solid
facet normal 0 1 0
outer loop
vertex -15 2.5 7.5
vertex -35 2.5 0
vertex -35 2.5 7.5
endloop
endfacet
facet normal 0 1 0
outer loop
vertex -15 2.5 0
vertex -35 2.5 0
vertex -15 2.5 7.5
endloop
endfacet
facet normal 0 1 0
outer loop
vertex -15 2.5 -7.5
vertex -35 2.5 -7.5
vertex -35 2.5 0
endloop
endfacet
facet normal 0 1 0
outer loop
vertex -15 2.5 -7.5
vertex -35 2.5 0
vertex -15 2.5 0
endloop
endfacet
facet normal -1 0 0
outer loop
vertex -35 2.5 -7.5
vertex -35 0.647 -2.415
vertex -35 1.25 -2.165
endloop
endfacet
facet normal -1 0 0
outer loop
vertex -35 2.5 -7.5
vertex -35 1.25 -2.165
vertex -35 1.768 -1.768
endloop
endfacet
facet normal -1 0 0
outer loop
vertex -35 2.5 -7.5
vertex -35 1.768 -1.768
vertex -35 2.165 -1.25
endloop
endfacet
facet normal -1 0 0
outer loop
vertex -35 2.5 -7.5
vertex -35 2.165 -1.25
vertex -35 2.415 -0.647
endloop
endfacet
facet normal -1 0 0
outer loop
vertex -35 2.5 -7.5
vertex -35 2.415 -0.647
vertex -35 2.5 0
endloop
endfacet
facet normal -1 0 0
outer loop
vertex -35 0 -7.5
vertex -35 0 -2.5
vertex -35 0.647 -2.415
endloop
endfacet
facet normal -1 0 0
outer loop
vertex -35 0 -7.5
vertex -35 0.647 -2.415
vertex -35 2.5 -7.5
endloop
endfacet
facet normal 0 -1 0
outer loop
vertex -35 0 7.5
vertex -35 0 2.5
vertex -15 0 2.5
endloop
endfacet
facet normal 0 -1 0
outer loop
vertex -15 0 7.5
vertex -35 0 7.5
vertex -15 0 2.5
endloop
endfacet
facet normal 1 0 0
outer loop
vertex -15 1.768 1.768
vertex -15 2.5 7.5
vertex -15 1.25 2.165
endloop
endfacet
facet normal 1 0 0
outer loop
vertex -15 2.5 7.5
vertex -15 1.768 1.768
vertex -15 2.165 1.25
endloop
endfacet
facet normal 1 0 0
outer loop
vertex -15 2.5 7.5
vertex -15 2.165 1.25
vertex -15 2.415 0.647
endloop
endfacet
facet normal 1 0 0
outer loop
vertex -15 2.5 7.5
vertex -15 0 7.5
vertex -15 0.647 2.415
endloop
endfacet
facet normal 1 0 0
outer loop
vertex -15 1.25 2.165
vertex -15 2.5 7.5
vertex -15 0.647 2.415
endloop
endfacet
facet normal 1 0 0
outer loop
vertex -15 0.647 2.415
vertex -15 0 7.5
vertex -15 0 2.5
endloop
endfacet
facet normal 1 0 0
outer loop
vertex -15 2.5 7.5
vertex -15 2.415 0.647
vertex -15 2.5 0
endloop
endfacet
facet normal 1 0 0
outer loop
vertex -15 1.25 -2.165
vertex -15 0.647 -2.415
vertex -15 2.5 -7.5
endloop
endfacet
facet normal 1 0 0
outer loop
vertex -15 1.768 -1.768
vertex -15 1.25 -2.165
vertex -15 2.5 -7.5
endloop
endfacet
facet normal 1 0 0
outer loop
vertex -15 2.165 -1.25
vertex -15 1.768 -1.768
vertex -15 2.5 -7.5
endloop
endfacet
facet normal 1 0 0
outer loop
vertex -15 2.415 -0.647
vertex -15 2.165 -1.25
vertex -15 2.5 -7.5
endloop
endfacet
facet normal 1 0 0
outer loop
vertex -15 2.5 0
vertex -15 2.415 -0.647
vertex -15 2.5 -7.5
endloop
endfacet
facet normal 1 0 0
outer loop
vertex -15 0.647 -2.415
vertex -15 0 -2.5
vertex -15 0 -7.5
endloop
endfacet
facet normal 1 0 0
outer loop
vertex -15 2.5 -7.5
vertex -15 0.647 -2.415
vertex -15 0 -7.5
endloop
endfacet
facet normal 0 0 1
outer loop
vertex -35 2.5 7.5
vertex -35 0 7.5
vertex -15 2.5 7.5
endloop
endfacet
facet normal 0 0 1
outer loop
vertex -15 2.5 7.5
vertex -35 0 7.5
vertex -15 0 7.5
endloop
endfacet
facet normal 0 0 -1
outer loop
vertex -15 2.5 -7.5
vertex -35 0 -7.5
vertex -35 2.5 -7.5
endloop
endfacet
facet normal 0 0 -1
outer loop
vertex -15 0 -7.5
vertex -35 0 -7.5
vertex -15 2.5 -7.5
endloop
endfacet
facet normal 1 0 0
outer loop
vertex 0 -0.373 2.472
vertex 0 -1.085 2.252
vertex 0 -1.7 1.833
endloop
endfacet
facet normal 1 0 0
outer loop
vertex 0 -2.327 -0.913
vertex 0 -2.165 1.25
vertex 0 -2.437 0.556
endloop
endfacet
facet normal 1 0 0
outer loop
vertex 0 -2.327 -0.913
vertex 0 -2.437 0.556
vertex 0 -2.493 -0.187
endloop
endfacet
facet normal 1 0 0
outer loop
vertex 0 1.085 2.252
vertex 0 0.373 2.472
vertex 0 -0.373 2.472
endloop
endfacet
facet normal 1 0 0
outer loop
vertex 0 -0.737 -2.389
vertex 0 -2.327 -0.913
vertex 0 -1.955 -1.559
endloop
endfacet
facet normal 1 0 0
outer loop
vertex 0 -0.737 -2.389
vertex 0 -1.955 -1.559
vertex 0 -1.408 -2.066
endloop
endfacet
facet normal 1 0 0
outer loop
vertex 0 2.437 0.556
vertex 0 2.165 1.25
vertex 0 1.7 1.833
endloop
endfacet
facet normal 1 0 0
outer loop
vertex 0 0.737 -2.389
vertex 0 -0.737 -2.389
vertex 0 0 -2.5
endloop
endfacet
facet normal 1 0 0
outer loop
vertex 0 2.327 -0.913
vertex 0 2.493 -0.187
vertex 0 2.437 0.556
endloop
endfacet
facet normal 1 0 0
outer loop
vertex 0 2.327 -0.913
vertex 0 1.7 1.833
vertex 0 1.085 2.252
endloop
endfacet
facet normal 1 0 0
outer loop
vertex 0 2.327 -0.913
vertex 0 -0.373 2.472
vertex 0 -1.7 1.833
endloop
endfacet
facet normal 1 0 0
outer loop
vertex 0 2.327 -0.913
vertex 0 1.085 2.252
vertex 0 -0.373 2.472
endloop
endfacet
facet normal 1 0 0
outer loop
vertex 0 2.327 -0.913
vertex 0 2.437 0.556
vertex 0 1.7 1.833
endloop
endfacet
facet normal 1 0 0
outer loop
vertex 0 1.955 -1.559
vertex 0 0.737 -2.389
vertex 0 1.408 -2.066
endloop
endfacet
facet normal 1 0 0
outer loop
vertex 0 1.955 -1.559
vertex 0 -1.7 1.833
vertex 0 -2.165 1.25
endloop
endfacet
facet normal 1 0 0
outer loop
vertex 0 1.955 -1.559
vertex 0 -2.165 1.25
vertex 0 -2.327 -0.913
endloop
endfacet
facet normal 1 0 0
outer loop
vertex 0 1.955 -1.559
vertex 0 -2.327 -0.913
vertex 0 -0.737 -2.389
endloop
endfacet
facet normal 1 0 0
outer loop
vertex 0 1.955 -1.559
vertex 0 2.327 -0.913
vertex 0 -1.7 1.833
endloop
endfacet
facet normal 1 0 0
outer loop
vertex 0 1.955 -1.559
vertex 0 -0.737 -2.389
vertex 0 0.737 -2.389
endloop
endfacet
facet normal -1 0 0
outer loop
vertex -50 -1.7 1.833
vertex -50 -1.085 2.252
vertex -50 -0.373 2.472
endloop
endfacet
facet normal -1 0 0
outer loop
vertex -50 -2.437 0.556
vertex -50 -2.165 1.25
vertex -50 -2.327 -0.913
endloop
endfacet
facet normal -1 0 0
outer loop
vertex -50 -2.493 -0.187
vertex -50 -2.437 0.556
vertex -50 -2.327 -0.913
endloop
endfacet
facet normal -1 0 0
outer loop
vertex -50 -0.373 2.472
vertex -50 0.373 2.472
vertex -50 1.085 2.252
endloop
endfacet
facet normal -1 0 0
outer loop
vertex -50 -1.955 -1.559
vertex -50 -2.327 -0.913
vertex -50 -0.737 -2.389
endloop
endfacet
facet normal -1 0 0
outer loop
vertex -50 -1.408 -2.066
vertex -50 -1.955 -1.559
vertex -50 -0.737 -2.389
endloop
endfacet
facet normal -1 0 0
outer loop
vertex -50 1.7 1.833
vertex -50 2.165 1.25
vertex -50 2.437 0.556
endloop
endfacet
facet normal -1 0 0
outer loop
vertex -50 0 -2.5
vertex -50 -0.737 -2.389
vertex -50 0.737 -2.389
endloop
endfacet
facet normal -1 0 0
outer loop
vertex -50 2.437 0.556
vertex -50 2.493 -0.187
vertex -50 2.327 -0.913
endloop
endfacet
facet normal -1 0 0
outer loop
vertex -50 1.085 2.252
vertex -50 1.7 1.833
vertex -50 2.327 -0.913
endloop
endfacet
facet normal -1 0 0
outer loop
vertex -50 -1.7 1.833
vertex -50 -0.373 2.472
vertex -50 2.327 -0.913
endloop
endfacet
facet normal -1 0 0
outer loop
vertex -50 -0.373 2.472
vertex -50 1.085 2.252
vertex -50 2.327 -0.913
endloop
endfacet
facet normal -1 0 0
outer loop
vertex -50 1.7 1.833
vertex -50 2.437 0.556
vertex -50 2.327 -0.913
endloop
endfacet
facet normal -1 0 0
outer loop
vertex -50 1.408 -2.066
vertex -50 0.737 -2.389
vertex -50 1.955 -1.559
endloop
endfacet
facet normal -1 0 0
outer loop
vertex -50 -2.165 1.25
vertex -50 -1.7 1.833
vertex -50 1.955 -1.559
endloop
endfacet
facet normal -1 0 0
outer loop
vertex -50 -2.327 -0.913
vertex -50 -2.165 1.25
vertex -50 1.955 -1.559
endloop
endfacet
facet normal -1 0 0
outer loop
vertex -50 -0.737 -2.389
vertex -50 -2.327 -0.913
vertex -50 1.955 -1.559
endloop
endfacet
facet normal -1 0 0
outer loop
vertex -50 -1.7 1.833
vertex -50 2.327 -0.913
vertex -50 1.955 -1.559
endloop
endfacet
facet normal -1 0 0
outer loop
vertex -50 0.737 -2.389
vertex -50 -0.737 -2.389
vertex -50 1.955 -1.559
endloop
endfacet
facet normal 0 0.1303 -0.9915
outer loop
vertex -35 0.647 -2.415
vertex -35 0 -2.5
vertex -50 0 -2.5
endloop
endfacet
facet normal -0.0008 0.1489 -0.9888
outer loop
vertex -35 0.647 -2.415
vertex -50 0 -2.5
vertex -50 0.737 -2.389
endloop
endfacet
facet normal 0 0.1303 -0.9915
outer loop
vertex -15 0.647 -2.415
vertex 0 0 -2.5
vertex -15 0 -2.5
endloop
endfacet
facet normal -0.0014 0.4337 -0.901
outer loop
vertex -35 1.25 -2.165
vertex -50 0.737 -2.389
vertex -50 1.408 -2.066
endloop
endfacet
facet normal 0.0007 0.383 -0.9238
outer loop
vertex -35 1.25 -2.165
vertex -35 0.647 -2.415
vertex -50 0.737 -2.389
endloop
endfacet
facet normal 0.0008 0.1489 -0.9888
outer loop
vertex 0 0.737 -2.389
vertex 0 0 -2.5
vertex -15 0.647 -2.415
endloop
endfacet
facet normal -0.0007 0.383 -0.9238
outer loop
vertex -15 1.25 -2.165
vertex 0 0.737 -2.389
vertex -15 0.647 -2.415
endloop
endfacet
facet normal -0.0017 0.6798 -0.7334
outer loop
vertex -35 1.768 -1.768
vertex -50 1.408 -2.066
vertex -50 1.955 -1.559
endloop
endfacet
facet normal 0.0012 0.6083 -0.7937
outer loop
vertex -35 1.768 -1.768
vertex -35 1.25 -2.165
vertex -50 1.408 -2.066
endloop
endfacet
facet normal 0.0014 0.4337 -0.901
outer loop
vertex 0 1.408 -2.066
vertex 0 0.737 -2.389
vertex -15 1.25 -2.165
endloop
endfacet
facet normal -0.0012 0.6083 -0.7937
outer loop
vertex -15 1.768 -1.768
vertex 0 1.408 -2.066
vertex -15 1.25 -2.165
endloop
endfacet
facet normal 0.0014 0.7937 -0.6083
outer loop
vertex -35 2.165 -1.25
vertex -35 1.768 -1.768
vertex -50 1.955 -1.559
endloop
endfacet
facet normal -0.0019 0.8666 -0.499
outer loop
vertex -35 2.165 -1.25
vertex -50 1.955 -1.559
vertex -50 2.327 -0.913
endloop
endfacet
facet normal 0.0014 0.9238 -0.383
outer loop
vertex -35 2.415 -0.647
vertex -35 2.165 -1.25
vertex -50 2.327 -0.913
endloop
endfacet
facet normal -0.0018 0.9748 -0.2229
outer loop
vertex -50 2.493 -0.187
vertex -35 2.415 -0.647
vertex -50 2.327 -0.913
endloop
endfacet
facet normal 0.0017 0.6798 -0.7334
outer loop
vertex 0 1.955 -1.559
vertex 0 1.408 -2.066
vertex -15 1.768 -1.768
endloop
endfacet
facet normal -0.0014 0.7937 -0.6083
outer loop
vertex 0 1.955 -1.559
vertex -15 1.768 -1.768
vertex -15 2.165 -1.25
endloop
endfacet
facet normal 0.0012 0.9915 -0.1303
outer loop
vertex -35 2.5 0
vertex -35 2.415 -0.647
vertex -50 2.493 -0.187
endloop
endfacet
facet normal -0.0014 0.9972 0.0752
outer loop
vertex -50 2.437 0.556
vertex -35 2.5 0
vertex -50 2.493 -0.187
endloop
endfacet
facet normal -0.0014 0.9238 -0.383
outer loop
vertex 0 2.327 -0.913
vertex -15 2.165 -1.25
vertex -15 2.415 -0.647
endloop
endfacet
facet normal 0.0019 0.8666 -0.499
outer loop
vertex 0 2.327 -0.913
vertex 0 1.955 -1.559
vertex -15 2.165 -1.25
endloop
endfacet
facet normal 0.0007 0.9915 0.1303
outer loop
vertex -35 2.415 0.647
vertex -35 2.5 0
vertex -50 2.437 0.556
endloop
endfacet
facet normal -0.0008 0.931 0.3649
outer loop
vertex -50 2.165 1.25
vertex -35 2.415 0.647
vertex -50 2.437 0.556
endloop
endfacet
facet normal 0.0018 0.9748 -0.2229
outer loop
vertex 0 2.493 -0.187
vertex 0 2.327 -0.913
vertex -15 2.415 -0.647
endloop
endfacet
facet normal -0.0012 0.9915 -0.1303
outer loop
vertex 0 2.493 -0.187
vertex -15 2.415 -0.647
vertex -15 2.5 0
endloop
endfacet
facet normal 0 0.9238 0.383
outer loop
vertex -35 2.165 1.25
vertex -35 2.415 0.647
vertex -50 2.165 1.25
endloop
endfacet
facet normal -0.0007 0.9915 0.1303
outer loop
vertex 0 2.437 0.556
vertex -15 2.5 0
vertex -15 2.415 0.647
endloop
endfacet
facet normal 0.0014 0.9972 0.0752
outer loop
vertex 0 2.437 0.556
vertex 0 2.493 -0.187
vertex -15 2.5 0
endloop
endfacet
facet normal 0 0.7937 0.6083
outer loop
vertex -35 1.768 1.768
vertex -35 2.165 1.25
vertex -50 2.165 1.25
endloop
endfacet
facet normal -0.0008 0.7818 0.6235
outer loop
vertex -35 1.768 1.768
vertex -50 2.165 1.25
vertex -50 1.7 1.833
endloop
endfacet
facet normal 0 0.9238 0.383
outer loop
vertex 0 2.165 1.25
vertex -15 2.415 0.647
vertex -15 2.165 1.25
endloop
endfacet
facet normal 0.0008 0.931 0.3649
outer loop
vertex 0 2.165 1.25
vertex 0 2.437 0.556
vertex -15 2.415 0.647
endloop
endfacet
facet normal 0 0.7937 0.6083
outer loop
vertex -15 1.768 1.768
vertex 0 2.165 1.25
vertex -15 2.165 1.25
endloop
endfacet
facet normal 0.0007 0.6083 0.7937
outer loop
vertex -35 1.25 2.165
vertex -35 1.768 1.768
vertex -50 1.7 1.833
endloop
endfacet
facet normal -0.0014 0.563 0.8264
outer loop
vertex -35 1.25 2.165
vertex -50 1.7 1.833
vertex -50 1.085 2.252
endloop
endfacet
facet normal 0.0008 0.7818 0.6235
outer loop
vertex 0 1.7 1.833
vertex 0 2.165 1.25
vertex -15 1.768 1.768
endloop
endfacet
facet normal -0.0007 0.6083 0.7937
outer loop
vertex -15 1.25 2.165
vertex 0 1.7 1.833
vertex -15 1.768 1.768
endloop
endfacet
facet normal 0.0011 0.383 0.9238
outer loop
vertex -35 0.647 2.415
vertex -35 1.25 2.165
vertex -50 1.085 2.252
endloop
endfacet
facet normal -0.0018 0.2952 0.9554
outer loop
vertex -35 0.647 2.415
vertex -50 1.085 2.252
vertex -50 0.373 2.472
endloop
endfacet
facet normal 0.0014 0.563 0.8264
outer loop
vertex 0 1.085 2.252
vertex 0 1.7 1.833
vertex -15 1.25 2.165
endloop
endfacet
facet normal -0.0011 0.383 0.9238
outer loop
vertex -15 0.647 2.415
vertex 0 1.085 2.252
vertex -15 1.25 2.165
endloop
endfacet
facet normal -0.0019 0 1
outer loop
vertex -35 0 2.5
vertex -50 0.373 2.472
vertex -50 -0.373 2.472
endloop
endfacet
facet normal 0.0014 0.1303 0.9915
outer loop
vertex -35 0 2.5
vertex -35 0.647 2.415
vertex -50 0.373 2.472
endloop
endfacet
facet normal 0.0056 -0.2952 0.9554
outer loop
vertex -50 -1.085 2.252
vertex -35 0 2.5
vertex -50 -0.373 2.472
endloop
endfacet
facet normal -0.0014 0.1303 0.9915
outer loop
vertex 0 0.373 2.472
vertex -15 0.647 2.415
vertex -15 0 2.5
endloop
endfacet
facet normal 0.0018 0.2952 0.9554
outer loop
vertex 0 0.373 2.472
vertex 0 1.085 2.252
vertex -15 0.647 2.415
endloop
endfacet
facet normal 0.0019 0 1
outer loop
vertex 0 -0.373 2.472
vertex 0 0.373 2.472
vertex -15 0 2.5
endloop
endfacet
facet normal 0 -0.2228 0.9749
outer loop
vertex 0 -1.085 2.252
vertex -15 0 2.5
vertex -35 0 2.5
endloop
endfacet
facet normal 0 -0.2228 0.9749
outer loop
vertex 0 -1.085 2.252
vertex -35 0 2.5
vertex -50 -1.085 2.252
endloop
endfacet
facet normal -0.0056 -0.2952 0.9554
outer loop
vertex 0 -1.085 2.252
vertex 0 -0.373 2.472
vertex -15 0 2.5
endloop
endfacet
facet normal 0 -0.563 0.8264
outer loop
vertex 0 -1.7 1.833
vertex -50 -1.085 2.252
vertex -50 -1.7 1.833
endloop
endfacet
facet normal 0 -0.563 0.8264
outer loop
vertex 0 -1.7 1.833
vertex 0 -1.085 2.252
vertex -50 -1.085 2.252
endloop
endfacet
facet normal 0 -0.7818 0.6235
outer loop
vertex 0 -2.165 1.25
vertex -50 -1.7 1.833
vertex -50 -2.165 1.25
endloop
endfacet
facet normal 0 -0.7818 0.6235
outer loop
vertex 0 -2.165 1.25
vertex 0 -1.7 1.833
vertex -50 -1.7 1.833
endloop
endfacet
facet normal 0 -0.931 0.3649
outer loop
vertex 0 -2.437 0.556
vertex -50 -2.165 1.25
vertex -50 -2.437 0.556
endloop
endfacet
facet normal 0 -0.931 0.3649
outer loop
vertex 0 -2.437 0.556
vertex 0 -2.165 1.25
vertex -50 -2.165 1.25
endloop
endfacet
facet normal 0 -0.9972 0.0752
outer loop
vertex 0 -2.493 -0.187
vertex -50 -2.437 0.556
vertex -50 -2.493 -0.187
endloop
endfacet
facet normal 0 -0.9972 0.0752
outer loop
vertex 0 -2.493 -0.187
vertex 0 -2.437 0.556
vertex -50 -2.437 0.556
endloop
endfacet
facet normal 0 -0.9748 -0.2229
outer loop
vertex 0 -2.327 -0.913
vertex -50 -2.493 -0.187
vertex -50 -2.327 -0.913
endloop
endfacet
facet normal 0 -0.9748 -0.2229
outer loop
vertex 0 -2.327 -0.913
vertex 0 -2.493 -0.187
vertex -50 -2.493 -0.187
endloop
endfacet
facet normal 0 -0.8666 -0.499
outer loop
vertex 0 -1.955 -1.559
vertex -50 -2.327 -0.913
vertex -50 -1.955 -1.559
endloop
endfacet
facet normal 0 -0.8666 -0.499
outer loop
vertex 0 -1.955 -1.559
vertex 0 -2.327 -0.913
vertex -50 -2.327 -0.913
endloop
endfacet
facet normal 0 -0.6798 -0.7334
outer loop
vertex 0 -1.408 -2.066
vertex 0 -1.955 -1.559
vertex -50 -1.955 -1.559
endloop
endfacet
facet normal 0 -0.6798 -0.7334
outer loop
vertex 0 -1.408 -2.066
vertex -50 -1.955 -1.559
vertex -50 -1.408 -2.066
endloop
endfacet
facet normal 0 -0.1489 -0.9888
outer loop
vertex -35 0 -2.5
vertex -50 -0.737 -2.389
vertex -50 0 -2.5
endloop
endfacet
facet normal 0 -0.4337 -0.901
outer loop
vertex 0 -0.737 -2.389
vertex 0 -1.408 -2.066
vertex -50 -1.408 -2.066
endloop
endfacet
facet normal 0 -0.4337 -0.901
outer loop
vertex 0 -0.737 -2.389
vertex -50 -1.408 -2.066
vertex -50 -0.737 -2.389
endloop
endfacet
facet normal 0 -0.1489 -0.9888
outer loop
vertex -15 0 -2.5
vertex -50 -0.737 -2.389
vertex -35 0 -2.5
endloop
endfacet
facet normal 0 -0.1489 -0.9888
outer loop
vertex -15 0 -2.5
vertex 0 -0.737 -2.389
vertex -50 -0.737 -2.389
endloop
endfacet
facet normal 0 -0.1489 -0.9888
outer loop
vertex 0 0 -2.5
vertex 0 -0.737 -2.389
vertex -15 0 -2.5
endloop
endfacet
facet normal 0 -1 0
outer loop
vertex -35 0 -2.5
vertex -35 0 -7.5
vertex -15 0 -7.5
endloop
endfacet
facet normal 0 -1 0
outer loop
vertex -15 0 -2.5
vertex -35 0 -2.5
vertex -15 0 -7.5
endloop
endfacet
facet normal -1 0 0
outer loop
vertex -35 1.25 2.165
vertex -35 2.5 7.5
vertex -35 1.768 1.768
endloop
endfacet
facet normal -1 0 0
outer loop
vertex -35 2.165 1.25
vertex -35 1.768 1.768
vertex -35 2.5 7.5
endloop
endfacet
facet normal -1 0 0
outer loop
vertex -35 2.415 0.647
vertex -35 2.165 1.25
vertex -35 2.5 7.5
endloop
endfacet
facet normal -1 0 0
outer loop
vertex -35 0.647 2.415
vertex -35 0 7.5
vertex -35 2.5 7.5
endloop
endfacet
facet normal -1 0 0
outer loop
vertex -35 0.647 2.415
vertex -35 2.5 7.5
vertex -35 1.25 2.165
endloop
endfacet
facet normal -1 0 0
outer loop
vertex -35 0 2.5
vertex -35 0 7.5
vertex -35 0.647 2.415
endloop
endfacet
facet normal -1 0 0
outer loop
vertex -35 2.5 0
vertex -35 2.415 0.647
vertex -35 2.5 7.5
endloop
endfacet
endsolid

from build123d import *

# Parameters (mm, degrees)
SKETCH_2_R          = 2.5
EXTRUDE_1_DEPTH     = 50
CUT_EXTRUDE_START   = -15
CUT_EXTRUDE_1_DEPTH = 20
SKETCH_5_W          = 20
SKETCH_5_H          = 15
EXTRUDE_2_DEPTH     = 2.5


with BuildPart() as part:
    # 草图2 → 凸台-拉伸1 (new body)
    with BuildSketch(Plane(origin=(0, 0, 0), x_dir=(0, 0, -1), z_dir=(1, 0, 0))):
        Circle(SKETCH_2_R)
    extrude(amount=-EXTRUDE_1_DEPTH)

    # 草图4 → 切除-拉伸1 (cut)
    with BuildSketch(Plane(origin=(0, 0, 0), x_dir=(0, 0, -1), z_dir=(1, 0, 0)).offset(CUT_EXTRUDE_START)):
        with BuildLine():
            Line((-2.5, 0), (2.5, 0))
            ThreePointArc((2.5, 0), (0, 2.5), (-2.5, 0))
        make_face()
    extrude(amount=-CUT_EXTRUDE_1_DEPTH, mode=Mode.SUBTRACT)

    # 草图5 → 凸台-拉伸2 (add)
    with BuildSketch(Plane(origin=(0, 0, 0), x_dir=(1, 0, 0), z_dir=(0, 1, 0))):
        with Locations((-25, 0)):
            Rectangle(SKETCH_5_W, SKETCH_5_H)
    extrude(amount=EXTRUDE_2_DEPTH)


solid = part.part
